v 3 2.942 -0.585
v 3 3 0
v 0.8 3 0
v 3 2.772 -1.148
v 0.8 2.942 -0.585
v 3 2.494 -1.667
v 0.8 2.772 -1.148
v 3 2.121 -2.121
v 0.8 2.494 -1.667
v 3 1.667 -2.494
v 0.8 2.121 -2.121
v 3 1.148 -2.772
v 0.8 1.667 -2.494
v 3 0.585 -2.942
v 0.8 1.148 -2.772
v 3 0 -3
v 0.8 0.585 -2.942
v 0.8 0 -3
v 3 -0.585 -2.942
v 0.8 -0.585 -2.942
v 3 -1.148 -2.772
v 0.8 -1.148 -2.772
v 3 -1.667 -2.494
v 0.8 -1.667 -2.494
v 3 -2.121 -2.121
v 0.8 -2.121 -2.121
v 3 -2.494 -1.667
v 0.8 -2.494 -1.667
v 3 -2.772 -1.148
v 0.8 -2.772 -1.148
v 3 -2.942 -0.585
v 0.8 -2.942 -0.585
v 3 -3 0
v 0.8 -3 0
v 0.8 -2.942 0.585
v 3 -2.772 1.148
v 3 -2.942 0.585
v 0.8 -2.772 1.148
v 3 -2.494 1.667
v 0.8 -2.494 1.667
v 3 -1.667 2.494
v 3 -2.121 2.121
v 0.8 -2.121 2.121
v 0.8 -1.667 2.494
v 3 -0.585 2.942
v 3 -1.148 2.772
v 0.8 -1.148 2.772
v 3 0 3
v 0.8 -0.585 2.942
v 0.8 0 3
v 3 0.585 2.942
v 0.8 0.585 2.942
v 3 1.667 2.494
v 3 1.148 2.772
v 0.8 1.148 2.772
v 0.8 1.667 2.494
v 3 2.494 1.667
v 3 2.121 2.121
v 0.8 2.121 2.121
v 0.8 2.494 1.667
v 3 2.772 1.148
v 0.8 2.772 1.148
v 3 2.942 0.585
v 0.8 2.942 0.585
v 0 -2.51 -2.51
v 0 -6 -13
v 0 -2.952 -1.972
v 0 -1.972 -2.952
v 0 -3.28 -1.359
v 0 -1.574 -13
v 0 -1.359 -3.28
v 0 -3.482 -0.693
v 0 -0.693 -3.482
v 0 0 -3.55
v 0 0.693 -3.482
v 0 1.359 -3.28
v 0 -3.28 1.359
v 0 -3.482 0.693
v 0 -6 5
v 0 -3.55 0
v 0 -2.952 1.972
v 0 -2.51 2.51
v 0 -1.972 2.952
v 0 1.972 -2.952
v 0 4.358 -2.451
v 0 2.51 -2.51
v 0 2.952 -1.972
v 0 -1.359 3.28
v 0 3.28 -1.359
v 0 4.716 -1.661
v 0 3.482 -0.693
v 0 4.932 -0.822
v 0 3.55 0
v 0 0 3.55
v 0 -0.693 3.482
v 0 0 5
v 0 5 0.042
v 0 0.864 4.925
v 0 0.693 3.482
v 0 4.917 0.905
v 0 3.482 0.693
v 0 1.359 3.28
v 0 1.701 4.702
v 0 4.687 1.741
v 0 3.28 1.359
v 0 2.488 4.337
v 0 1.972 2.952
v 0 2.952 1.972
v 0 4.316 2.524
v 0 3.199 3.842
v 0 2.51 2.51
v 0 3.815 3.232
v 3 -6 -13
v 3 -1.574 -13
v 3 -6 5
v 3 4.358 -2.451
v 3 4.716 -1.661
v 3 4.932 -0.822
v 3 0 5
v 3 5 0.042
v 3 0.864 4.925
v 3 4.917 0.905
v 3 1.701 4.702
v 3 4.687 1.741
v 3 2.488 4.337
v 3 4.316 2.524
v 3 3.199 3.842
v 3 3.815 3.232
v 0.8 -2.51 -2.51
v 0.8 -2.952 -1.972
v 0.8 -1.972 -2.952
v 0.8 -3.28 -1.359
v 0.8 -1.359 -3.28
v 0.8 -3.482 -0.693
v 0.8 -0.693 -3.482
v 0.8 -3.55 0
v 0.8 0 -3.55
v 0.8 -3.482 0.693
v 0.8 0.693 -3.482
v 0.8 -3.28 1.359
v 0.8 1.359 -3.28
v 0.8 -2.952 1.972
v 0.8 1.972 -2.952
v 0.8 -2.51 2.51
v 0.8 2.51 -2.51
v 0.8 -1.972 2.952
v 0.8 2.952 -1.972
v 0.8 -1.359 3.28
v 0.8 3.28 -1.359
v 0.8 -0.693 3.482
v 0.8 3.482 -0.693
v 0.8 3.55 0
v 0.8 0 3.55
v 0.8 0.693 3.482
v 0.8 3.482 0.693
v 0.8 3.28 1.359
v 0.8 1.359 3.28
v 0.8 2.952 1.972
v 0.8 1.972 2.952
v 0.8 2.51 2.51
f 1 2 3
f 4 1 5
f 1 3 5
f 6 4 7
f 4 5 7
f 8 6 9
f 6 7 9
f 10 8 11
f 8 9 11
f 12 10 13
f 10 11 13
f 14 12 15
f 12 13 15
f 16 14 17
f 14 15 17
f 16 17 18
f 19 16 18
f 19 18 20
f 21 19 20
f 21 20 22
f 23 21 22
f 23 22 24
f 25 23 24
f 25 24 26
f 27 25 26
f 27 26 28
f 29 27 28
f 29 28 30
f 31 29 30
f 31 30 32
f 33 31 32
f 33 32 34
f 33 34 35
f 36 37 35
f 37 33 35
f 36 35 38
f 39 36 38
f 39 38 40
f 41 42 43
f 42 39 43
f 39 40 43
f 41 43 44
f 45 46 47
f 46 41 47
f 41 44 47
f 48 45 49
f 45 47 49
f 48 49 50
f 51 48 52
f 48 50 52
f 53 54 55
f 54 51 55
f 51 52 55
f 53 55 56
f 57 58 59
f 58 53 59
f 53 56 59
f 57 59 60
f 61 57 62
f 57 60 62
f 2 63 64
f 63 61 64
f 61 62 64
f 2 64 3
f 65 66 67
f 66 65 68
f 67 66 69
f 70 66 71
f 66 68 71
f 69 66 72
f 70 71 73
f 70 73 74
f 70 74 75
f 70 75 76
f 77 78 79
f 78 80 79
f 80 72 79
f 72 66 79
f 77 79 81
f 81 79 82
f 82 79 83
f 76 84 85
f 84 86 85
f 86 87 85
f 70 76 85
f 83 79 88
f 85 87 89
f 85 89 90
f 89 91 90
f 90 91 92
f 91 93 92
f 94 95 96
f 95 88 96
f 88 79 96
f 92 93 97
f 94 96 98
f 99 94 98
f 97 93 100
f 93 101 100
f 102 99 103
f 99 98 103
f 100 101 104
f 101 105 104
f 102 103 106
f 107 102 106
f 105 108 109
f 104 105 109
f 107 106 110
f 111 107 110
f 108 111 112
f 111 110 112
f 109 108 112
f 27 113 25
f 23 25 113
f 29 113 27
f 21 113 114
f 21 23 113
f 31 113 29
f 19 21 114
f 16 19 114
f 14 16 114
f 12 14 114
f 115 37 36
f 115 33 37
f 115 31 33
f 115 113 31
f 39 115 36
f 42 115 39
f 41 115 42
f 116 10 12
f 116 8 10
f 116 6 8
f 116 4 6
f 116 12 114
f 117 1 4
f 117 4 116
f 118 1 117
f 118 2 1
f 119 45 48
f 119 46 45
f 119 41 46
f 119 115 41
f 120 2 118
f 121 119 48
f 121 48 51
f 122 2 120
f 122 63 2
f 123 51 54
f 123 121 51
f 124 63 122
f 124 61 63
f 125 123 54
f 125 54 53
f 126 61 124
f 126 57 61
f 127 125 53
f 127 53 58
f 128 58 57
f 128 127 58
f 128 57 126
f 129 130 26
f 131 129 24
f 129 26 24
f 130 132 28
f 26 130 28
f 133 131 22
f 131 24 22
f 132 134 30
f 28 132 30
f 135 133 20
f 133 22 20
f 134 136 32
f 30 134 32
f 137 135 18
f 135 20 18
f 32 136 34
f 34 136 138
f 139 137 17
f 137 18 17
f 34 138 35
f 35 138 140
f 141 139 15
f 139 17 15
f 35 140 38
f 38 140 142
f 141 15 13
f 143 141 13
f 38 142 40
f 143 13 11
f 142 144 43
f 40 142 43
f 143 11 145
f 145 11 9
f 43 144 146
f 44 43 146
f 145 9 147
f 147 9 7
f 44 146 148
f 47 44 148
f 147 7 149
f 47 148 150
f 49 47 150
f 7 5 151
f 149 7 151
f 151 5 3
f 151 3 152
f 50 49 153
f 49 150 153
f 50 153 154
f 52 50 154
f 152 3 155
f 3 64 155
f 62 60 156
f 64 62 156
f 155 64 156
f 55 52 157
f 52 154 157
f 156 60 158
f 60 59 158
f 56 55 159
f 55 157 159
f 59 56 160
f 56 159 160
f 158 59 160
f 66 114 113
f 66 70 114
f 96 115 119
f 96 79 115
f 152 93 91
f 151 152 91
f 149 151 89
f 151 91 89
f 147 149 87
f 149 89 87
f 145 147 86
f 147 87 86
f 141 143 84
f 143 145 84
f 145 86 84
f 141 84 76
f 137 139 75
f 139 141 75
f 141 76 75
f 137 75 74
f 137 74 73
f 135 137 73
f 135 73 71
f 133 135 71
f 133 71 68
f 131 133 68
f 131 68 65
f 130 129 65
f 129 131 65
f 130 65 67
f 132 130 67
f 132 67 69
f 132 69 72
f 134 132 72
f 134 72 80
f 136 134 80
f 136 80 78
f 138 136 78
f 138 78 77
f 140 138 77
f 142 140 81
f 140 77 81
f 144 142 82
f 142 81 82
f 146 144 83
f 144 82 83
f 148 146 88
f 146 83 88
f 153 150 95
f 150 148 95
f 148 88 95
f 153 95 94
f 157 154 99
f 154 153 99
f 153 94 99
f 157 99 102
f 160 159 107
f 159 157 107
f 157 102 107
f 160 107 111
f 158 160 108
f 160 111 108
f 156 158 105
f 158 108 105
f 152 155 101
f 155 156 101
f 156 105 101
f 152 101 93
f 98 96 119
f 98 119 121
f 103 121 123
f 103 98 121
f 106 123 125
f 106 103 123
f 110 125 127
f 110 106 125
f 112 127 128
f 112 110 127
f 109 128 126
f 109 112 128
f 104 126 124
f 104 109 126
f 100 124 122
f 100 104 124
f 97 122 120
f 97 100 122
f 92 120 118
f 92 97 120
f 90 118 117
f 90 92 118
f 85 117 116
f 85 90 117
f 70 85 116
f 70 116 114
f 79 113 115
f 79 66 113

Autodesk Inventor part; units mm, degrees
ref_plane "YZ Plane" through (0, 0, 0) normal (1, 0, 0) x (0, 1, 0)
ref_plane "XZ Plane" through (0, 0, 0) normal (0, 1, 0) x (-1, 0, 0)
ref_plane "XY Plane" through (0, 0, 0) normal (0, 0, 1) x (1, 0, 0)
sketch "スケッチ1" plane through (0, 0, 0) normal (1, 0, 0) x (0, 1, 0)
  circle A0 centre (0, 0) radius 3.55
  arc A1 (4.3581, -2.4508) -> (0, 5) centre (0, 0) ccw
  line L0 (4.3581, -2.4508) -> (-1.5743, -13)
  line L1 (-1.5743, -13) -> (-6, -13)
  line L2 (-6, -13) -> (-6, 5)
  line L3 (-6, 5) -> (0, 5)
  circle A2 centre (0, 0) radius 3
  dimension "d0" = 7.1
  dimension "d1" = 5
  dimension "d2" = 18
  dimension "d3" = 6
  dimension "d6" = 6
extrude "押し出し1" add sketch "スケッチ1" along normal blind 3 contours A0 | L0 L1 L2 L3 A1
extrude "押し出し2" cut sketch "スケッチ1" along normal blind 0.8 contours A0 | A2
properties part number "Stand"
